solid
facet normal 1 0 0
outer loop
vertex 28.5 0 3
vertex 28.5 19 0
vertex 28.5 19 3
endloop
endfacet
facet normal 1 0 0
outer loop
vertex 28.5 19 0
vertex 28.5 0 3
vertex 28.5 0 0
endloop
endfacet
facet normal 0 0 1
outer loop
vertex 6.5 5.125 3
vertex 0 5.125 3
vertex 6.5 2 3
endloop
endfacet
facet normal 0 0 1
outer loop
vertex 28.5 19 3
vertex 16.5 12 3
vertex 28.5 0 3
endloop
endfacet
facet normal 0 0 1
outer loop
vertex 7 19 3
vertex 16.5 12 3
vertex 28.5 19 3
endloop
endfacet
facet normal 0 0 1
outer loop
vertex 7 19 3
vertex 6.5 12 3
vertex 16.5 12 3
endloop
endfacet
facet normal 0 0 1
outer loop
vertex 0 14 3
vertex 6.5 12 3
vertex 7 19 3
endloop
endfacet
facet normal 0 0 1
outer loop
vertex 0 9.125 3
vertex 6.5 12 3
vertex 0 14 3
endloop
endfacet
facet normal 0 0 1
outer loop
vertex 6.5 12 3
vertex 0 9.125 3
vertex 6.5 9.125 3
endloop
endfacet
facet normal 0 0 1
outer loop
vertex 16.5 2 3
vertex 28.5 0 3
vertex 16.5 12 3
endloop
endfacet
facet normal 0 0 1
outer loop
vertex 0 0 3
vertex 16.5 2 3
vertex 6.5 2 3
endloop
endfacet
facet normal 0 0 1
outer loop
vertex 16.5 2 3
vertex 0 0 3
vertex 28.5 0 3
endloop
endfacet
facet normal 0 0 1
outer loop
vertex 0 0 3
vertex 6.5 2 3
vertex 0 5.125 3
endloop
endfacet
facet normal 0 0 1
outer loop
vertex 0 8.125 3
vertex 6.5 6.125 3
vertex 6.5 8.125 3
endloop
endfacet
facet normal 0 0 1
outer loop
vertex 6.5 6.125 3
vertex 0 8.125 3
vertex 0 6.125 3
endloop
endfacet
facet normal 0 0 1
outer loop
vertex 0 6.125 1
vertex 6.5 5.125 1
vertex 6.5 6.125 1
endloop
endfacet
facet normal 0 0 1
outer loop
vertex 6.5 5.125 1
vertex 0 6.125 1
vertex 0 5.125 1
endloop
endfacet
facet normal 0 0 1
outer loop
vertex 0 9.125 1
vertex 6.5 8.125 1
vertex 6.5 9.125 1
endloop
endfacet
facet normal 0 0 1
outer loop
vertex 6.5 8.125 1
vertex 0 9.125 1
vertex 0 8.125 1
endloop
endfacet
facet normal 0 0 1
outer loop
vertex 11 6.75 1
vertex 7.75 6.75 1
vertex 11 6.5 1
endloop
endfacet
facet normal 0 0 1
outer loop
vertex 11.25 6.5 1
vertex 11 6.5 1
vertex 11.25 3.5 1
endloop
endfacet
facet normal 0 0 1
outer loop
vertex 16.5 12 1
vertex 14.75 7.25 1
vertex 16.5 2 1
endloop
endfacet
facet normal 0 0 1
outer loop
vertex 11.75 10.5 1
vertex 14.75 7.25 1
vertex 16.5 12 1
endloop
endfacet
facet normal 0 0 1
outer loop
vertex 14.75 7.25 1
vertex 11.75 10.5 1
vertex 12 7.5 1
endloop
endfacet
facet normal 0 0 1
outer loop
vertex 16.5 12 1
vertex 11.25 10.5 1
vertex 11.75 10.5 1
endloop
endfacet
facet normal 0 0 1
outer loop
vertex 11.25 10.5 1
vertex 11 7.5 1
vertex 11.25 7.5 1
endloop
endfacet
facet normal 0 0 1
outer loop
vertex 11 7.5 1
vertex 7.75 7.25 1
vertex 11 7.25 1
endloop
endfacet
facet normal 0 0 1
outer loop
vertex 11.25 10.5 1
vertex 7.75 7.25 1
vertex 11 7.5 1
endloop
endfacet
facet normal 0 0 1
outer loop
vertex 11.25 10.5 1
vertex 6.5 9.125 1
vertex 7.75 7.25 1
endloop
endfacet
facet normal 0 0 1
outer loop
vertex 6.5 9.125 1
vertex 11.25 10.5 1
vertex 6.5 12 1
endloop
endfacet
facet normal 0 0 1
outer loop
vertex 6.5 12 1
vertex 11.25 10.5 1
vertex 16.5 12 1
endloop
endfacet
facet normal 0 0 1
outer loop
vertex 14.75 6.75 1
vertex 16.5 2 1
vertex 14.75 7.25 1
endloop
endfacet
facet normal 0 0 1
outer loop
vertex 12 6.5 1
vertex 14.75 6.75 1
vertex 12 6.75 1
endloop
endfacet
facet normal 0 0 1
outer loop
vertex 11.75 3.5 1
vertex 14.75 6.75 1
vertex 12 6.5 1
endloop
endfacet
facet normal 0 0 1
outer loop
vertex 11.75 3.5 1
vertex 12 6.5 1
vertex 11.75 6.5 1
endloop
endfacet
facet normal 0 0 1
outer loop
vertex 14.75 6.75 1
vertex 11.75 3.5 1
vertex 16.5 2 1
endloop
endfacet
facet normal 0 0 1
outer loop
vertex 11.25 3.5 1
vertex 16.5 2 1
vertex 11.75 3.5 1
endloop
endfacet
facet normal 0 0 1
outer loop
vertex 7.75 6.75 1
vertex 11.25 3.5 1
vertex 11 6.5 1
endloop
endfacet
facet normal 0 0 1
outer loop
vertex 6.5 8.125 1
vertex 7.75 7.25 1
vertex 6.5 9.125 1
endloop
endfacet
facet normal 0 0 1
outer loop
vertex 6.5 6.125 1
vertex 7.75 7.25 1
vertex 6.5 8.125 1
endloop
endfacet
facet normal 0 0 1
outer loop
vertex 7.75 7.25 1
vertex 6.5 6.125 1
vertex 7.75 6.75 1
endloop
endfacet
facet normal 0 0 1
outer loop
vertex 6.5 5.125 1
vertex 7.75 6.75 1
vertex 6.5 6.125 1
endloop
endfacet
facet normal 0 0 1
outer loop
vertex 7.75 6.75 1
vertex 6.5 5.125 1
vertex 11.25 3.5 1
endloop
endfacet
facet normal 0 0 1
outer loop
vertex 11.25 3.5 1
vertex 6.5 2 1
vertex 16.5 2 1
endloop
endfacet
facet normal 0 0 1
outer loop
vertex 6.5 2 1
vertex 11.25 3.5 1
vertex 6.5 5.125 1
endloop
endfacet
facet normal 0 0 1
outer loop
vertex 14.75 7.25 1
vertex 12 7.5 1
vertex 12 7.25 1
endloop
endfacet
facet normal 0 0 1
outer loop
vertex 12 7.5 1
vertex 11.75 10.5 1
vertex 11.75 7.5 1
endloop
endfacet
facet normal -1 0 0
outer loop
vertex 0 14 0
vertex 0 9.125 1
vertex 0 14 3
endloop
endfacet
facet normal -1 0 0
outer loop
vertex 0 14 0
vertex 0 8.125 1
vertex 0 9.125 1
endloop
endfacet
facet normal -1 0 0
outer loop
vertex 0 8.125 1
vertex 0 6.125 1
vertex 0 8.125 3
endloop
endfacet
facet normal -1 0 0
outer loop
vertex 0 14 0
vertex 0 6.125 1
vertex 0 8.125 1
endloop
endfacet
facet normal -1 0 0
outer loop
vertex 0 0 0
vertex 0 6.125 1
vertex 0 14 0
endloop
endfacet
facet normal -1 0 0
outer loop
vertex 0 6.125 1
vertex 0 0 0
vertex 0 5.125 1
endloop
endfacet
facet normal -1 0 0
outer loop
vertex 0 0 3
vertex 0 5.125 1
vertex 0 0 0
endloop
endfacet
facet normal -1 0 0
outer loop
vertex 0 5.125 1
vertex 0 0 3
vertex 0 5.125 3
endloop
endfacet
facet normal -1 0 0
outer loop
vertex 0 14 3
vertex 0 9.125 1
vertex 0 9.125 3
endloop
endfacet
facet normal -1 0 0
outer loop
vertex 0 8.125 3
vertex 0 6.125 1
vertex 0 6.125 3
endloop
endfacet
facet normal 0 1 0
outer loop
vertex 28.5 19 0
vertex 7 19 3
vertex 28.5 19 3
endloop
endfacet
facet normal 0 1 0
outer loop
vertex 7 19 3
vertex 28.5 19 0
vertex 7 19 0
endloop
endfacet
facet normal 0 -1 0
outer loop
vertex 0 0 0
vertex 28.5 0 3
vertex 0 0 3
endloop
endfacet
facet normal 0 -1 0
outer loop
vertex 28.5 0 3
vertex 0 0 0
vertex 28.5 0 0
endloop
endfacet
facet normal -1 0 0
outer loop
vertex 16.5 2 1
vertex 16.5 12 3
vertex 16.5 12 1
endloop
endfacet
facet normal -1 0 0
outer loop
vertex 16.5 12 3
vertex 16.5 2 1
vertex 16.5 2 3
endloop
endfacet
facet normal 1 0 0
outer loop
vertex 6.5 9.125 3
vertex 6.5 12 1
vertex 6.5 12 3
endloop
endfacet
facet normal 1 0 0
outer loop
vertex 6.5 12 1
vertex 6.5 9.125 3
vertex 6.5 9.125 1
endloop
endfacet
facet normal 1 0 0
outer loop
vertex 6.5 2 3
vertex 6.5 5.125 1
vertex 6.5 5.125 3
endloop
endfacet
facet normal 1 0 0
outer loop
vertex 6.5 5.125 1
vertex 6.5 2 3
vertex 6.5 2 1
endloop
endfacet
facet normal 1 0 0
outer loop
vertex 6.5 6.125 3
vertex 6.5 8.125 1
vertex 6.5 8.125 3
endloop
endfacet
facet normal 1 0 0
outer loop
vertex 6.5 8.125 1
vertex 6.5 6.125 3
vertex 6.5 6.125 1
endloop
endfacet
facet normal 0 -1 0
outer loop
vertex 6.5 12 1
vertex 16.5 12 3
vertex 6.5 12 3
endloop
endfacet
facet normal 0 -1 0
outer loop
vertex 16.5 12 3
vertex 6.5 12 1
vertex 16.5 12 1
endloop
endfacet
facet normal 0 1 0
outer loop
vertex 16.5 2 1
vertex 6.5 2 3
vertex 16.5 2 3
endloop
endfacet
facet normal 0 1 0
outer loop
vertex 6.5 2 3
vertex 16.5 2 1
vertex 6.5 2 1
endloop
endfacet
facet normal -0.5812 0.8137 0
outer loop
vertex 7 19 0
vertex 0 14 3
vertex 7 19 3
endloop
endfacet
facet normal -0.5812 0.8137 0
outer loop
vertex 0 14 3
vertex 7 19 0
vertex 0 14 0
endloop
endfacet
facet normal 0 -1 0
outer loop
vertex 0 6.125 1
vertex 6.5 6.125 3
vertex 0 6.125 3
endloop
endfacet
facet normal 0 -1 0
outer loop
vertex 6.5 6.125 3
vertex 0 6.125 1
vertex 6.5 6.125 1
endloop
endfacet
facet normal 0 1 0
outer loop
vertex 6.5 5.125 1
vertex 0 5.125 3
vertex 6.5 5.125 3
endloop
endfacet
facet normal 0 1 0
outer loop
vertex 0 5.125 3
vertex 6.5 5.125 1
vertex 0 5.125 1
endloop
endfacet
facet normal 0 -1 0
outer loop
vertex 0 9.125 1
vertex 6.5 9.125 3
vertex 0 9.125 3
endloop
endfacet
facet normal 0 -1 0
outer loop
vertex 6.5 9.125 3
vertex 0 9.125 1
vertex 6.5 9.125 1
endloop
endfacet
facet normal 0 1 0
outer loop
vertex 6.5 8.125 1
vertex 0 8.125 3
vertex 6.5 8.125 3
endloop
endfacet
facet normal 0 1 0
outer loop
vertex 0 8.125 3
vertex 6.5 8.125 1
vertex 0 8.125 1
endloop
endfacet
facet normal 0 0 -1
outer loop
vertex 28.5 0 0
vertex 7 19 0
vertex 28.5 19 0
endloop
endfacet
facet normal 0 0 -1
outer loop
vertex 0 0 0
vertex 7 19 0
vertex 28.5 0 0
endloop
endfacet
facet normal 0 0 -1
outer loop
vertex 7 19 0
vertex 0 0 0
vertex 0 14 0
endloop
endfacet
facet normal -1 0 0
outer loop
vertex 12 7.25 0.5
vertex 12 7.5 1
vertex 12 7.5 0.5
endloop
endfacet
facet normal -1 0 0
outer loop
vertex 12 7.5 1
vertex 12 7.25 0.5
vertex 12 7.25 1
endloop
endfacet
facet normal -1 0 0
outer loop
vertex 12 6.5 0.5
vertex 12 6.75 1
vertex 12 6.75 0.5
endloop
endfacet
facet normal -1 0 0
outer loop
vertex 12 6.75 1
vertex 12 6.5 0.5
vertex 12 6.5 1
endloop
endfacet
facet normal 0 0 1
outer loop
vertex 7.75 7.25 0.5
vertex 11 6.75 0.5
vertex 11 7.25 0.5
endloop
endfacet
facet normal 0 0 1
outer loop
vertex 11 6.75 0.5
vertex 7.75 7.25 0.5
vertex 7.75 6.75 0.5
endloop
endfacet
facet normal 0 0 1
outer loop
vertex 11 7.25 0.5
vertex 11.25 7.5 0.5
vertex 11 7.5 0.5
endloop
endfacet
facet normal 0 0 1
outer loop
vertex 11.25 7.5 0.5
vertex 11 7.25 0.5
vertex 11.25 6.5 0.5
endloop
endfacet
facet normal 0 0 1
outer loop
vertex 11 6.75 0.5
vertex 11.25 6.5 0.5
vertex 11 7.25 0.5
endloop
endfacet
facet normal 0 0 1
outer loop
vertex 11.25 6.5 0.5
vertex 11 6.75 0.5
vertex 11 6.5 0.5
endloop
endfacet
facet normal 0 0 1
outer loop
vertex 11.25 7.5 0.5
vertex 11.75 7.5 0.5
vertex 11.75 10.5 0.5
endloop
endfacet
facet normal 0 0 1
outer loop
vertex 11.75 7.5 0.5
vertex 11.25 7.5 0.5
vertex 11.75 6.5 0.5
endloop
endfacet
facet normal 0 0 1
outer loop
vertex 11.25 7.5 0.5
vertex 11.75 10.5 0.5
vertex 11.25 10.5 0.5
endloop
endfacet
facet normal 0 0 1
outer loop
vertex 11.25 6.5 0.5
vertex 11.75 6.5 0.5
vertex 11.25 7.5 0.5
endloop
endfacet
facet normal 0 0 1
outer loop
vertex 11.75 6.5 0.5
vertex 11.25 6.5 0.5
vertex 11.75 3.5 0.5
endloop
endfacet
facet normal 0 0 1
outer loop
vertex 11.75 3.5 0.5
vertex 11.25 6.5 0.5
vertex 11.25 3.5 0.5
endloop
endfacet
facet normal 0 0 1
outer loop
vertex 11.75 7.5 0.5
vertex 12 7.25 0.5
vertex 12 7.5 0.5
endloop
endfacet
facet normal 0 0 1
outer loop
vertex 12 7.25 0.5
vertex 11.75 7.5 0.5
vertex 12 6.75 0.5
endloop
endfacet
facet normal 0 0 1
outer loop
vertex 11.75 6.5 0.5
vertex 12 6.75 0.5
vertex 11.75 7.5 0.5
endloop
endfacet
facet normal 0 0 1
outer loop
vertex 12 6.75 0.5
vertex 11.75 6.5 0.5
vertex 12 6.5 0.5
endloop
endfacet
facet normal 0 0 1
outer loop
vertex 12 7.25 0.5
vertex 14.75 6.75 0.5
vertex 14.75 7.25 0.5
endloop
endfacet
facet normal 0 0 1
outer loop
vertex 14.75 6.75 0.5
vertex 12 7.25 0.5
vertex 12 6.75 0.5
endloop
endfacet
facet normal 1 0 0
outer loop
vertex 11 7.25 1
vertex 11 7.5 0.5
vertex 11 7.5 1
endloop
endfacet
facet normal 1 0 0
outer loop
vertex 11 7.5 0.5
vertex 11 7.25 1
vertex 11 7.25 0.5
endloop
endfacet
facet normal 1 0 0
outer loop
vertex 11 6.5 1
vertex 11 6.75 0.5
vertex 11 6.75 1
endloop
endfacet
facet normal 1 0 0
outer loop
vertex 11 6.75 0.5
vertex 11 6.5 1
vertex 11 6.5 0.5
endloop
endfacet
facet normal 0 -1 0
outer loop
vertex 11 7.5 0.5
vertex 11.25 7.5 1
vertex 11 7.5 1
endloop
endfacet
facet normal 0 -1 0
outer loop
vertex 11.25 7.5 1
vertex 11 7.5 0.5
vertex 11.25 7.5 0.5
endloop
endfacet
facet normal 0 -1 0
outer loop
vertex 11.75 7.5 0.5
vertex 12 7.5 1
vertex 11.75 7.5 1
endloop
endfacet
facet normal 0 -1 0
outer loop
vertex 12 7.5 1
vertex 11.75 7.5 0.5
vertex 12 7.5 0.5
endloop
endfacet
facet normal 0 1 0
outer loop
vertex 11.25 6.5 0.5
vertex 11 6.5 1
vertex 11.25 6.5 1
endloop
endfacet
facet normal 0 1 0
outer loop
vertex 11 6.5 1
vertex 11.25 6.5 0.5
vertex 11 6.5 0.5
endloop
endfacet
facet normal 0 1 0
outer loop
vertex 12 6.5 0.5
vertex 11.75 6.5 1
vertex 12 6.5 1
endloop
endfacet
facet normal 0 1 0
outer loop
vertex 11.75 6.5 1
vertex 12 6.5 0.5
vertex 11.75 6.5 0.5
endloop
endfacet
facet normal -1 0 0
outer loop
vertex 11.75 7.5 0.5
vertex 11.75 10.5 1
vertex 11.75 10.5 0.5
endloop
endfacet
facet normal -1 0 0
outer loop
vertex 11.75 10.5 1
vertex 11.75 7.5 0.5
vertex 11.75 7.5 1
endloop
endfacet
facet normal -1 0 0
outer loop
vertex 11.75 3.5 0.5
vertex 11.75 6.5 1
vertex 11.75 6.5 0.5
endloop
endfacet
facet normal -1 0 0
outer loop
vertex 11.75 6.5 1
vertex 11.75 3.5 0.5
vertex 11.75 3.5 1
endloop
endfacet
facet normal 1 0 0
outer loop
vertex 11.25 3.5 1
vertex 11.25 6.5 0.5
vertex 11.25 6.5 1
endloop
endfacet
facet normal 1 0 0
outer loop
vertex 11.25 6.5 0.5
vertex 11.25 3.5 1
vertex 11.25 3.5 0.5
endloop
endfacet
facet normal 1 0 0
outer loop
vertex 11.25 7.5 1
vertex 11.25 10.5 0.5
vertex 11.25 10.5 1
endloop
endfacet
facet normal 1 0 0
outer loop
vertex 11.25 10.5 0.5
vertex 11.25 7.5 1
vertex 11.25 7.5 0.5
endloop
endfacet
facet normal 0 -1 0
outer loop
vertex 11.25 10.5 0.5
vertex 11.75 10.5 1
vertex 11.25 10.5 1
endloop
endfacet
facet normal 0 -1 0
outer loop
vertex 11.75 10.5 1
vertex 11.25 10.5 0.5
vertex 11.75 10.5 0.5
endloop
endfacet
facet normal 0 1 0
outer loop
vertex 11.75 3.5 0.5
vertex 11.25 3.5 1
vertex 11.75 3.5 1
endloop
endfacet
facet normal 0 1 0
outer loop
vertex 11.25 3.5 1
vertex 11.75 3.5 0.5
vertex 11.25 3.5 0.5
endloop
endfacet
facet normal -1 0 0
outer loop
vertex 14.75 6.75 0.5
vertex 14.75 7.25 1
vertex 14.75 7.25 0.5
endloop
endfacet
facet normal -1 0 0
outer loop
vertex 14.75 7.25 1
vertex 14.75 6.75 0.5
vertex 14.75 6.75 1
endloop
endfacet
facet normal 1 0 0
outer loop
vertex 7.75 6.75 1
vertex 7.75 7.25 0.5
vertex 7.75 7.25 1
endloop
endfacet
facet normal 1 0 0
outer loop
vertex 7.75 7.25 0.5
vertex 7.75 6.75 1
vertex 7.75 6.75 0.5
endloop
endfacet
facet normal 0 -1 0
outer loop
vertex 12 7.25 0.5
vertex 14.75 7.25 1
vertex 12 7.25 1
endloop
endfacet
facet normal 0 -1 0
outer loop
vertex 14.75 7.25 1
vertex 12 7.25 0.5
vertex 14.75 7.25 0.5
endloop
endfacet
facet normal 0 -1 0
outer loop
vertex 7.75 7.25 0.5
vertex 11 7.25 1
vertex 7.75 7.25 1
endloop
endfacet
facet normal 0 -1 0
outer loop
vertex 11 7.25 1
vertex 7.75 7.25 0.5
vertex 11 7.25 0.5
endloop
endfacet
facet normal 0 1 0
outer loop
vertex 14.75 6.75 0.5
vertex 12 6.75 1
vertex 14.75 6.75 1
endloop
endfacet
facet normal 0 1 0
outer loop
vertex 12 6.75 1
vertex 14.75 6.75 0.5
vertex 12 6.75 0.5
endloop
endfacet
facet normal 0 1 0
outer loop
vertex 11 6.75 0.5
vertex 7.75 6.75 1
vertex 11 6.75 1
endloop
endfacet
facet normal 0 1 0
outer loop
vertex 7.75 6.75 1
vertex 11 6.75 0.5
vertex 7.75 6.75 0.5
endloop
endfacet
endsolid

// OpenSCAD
thickness = 3.0;
base = 1.0;
width = 28.5;
height = 19;        // made 1mm larger
hole_width = 10.0;
hole_height = 10.0;
hole_NE_x = 6.5;//12.5;   // was 12.5 (d5512.5+10+5.5 = 28)
hole_NE_y = 2;

pin_x = 11;     // was 17
pin_y = 6.5;
pin_width = 1.0;
pin_bredth = 1.0;
pin_depth = 0.5;

cut_out_N_x_offset=0;
cut_out_N_y_offset=height-5;
cut_out_S_x_offset=0;
cut_out_S_y_offset=height;
cut_out_E_x_offset=7;
cut_out_E_y_offset=height;

wire_notch_upper_N_y_offset=5.125;
wire_notch_lower_N_y_offset=8.125;
wire_notch_length=6.5;


cross_hair_90_degree_length=7;
cross_hair_thickness = 0.5;

cross_hair_north_south_x_offset=pin_x+pin_width/4.0;

cross_hair_north_south_y_offset=pin_y+pin_bredth/2.0-cross_hair_90_degree_length/2.0;

cross_hair_east_west_x_offset=cross_hair_north_south_x_offset-cross_hair_90_degree_length/2.0;

cross_hair_east_west_y_offset=cross_hair_north_south_y_offset-pin_bredth/4.0+cross_hair_90_degree_length/2.0;

translate([0,0,1])

    difference()
    {
        cube([width,height,thickness-base]);
        
        translate ([hole_NE_x,hole_NE_y,0])
            cube([hole_width,hole_height,thickness-base]);

        linear_extrude(height = thickness, center = false)
            translate([0,0,thickness])
                polygon(points=[[cut_out_N_x_offset,cut_out_N_y_offset],[cut_out_S_x_offset,cut_out_S_y_offset],[cut_out_E_x_offset,cut_out_E_y_offset]]);

// was 22.5
        translate ([0,wire_notch_upper_N_y_offset,0])
            cube([wire_notch_length,1,thickness]);

        translate ([0,wire_notch_lower_N_y_offset,0])
            cube([wire_notch_length,1,thickness]);
    }

    difference()
    {
        cube([width,height,base]);

        translate ([pin_x,pin_y,base-pin_depth])
            cube([pin_width,pin_bredth,pin_depth]);
        
        translate ([cross_hair_north_south_x_offset,cross_hair_north_south_y_offset,base-pin_depth])
            cube([cross_hair_thickness,cross_hair_90_degree_length,thickness-base]);

        translate ([cross_hair_east_west_x_offset,cross_hair_east_west_y_offset,base-pin_depth])
            cube([cross_hair_90_degree_length,cross_hair_thickness, thickness-base]);

        linear_extrude(height = thickness, center = false)
            translate([0,0,thickness])
                polygon(points=[[cut_out_N_x_offset,cut_out_N_y_offset],[cut_out_S_x_offset,cut_out_S_y_offset],[cut_out_E_x_offset,cut_out_E_y_offset]]);

    }
